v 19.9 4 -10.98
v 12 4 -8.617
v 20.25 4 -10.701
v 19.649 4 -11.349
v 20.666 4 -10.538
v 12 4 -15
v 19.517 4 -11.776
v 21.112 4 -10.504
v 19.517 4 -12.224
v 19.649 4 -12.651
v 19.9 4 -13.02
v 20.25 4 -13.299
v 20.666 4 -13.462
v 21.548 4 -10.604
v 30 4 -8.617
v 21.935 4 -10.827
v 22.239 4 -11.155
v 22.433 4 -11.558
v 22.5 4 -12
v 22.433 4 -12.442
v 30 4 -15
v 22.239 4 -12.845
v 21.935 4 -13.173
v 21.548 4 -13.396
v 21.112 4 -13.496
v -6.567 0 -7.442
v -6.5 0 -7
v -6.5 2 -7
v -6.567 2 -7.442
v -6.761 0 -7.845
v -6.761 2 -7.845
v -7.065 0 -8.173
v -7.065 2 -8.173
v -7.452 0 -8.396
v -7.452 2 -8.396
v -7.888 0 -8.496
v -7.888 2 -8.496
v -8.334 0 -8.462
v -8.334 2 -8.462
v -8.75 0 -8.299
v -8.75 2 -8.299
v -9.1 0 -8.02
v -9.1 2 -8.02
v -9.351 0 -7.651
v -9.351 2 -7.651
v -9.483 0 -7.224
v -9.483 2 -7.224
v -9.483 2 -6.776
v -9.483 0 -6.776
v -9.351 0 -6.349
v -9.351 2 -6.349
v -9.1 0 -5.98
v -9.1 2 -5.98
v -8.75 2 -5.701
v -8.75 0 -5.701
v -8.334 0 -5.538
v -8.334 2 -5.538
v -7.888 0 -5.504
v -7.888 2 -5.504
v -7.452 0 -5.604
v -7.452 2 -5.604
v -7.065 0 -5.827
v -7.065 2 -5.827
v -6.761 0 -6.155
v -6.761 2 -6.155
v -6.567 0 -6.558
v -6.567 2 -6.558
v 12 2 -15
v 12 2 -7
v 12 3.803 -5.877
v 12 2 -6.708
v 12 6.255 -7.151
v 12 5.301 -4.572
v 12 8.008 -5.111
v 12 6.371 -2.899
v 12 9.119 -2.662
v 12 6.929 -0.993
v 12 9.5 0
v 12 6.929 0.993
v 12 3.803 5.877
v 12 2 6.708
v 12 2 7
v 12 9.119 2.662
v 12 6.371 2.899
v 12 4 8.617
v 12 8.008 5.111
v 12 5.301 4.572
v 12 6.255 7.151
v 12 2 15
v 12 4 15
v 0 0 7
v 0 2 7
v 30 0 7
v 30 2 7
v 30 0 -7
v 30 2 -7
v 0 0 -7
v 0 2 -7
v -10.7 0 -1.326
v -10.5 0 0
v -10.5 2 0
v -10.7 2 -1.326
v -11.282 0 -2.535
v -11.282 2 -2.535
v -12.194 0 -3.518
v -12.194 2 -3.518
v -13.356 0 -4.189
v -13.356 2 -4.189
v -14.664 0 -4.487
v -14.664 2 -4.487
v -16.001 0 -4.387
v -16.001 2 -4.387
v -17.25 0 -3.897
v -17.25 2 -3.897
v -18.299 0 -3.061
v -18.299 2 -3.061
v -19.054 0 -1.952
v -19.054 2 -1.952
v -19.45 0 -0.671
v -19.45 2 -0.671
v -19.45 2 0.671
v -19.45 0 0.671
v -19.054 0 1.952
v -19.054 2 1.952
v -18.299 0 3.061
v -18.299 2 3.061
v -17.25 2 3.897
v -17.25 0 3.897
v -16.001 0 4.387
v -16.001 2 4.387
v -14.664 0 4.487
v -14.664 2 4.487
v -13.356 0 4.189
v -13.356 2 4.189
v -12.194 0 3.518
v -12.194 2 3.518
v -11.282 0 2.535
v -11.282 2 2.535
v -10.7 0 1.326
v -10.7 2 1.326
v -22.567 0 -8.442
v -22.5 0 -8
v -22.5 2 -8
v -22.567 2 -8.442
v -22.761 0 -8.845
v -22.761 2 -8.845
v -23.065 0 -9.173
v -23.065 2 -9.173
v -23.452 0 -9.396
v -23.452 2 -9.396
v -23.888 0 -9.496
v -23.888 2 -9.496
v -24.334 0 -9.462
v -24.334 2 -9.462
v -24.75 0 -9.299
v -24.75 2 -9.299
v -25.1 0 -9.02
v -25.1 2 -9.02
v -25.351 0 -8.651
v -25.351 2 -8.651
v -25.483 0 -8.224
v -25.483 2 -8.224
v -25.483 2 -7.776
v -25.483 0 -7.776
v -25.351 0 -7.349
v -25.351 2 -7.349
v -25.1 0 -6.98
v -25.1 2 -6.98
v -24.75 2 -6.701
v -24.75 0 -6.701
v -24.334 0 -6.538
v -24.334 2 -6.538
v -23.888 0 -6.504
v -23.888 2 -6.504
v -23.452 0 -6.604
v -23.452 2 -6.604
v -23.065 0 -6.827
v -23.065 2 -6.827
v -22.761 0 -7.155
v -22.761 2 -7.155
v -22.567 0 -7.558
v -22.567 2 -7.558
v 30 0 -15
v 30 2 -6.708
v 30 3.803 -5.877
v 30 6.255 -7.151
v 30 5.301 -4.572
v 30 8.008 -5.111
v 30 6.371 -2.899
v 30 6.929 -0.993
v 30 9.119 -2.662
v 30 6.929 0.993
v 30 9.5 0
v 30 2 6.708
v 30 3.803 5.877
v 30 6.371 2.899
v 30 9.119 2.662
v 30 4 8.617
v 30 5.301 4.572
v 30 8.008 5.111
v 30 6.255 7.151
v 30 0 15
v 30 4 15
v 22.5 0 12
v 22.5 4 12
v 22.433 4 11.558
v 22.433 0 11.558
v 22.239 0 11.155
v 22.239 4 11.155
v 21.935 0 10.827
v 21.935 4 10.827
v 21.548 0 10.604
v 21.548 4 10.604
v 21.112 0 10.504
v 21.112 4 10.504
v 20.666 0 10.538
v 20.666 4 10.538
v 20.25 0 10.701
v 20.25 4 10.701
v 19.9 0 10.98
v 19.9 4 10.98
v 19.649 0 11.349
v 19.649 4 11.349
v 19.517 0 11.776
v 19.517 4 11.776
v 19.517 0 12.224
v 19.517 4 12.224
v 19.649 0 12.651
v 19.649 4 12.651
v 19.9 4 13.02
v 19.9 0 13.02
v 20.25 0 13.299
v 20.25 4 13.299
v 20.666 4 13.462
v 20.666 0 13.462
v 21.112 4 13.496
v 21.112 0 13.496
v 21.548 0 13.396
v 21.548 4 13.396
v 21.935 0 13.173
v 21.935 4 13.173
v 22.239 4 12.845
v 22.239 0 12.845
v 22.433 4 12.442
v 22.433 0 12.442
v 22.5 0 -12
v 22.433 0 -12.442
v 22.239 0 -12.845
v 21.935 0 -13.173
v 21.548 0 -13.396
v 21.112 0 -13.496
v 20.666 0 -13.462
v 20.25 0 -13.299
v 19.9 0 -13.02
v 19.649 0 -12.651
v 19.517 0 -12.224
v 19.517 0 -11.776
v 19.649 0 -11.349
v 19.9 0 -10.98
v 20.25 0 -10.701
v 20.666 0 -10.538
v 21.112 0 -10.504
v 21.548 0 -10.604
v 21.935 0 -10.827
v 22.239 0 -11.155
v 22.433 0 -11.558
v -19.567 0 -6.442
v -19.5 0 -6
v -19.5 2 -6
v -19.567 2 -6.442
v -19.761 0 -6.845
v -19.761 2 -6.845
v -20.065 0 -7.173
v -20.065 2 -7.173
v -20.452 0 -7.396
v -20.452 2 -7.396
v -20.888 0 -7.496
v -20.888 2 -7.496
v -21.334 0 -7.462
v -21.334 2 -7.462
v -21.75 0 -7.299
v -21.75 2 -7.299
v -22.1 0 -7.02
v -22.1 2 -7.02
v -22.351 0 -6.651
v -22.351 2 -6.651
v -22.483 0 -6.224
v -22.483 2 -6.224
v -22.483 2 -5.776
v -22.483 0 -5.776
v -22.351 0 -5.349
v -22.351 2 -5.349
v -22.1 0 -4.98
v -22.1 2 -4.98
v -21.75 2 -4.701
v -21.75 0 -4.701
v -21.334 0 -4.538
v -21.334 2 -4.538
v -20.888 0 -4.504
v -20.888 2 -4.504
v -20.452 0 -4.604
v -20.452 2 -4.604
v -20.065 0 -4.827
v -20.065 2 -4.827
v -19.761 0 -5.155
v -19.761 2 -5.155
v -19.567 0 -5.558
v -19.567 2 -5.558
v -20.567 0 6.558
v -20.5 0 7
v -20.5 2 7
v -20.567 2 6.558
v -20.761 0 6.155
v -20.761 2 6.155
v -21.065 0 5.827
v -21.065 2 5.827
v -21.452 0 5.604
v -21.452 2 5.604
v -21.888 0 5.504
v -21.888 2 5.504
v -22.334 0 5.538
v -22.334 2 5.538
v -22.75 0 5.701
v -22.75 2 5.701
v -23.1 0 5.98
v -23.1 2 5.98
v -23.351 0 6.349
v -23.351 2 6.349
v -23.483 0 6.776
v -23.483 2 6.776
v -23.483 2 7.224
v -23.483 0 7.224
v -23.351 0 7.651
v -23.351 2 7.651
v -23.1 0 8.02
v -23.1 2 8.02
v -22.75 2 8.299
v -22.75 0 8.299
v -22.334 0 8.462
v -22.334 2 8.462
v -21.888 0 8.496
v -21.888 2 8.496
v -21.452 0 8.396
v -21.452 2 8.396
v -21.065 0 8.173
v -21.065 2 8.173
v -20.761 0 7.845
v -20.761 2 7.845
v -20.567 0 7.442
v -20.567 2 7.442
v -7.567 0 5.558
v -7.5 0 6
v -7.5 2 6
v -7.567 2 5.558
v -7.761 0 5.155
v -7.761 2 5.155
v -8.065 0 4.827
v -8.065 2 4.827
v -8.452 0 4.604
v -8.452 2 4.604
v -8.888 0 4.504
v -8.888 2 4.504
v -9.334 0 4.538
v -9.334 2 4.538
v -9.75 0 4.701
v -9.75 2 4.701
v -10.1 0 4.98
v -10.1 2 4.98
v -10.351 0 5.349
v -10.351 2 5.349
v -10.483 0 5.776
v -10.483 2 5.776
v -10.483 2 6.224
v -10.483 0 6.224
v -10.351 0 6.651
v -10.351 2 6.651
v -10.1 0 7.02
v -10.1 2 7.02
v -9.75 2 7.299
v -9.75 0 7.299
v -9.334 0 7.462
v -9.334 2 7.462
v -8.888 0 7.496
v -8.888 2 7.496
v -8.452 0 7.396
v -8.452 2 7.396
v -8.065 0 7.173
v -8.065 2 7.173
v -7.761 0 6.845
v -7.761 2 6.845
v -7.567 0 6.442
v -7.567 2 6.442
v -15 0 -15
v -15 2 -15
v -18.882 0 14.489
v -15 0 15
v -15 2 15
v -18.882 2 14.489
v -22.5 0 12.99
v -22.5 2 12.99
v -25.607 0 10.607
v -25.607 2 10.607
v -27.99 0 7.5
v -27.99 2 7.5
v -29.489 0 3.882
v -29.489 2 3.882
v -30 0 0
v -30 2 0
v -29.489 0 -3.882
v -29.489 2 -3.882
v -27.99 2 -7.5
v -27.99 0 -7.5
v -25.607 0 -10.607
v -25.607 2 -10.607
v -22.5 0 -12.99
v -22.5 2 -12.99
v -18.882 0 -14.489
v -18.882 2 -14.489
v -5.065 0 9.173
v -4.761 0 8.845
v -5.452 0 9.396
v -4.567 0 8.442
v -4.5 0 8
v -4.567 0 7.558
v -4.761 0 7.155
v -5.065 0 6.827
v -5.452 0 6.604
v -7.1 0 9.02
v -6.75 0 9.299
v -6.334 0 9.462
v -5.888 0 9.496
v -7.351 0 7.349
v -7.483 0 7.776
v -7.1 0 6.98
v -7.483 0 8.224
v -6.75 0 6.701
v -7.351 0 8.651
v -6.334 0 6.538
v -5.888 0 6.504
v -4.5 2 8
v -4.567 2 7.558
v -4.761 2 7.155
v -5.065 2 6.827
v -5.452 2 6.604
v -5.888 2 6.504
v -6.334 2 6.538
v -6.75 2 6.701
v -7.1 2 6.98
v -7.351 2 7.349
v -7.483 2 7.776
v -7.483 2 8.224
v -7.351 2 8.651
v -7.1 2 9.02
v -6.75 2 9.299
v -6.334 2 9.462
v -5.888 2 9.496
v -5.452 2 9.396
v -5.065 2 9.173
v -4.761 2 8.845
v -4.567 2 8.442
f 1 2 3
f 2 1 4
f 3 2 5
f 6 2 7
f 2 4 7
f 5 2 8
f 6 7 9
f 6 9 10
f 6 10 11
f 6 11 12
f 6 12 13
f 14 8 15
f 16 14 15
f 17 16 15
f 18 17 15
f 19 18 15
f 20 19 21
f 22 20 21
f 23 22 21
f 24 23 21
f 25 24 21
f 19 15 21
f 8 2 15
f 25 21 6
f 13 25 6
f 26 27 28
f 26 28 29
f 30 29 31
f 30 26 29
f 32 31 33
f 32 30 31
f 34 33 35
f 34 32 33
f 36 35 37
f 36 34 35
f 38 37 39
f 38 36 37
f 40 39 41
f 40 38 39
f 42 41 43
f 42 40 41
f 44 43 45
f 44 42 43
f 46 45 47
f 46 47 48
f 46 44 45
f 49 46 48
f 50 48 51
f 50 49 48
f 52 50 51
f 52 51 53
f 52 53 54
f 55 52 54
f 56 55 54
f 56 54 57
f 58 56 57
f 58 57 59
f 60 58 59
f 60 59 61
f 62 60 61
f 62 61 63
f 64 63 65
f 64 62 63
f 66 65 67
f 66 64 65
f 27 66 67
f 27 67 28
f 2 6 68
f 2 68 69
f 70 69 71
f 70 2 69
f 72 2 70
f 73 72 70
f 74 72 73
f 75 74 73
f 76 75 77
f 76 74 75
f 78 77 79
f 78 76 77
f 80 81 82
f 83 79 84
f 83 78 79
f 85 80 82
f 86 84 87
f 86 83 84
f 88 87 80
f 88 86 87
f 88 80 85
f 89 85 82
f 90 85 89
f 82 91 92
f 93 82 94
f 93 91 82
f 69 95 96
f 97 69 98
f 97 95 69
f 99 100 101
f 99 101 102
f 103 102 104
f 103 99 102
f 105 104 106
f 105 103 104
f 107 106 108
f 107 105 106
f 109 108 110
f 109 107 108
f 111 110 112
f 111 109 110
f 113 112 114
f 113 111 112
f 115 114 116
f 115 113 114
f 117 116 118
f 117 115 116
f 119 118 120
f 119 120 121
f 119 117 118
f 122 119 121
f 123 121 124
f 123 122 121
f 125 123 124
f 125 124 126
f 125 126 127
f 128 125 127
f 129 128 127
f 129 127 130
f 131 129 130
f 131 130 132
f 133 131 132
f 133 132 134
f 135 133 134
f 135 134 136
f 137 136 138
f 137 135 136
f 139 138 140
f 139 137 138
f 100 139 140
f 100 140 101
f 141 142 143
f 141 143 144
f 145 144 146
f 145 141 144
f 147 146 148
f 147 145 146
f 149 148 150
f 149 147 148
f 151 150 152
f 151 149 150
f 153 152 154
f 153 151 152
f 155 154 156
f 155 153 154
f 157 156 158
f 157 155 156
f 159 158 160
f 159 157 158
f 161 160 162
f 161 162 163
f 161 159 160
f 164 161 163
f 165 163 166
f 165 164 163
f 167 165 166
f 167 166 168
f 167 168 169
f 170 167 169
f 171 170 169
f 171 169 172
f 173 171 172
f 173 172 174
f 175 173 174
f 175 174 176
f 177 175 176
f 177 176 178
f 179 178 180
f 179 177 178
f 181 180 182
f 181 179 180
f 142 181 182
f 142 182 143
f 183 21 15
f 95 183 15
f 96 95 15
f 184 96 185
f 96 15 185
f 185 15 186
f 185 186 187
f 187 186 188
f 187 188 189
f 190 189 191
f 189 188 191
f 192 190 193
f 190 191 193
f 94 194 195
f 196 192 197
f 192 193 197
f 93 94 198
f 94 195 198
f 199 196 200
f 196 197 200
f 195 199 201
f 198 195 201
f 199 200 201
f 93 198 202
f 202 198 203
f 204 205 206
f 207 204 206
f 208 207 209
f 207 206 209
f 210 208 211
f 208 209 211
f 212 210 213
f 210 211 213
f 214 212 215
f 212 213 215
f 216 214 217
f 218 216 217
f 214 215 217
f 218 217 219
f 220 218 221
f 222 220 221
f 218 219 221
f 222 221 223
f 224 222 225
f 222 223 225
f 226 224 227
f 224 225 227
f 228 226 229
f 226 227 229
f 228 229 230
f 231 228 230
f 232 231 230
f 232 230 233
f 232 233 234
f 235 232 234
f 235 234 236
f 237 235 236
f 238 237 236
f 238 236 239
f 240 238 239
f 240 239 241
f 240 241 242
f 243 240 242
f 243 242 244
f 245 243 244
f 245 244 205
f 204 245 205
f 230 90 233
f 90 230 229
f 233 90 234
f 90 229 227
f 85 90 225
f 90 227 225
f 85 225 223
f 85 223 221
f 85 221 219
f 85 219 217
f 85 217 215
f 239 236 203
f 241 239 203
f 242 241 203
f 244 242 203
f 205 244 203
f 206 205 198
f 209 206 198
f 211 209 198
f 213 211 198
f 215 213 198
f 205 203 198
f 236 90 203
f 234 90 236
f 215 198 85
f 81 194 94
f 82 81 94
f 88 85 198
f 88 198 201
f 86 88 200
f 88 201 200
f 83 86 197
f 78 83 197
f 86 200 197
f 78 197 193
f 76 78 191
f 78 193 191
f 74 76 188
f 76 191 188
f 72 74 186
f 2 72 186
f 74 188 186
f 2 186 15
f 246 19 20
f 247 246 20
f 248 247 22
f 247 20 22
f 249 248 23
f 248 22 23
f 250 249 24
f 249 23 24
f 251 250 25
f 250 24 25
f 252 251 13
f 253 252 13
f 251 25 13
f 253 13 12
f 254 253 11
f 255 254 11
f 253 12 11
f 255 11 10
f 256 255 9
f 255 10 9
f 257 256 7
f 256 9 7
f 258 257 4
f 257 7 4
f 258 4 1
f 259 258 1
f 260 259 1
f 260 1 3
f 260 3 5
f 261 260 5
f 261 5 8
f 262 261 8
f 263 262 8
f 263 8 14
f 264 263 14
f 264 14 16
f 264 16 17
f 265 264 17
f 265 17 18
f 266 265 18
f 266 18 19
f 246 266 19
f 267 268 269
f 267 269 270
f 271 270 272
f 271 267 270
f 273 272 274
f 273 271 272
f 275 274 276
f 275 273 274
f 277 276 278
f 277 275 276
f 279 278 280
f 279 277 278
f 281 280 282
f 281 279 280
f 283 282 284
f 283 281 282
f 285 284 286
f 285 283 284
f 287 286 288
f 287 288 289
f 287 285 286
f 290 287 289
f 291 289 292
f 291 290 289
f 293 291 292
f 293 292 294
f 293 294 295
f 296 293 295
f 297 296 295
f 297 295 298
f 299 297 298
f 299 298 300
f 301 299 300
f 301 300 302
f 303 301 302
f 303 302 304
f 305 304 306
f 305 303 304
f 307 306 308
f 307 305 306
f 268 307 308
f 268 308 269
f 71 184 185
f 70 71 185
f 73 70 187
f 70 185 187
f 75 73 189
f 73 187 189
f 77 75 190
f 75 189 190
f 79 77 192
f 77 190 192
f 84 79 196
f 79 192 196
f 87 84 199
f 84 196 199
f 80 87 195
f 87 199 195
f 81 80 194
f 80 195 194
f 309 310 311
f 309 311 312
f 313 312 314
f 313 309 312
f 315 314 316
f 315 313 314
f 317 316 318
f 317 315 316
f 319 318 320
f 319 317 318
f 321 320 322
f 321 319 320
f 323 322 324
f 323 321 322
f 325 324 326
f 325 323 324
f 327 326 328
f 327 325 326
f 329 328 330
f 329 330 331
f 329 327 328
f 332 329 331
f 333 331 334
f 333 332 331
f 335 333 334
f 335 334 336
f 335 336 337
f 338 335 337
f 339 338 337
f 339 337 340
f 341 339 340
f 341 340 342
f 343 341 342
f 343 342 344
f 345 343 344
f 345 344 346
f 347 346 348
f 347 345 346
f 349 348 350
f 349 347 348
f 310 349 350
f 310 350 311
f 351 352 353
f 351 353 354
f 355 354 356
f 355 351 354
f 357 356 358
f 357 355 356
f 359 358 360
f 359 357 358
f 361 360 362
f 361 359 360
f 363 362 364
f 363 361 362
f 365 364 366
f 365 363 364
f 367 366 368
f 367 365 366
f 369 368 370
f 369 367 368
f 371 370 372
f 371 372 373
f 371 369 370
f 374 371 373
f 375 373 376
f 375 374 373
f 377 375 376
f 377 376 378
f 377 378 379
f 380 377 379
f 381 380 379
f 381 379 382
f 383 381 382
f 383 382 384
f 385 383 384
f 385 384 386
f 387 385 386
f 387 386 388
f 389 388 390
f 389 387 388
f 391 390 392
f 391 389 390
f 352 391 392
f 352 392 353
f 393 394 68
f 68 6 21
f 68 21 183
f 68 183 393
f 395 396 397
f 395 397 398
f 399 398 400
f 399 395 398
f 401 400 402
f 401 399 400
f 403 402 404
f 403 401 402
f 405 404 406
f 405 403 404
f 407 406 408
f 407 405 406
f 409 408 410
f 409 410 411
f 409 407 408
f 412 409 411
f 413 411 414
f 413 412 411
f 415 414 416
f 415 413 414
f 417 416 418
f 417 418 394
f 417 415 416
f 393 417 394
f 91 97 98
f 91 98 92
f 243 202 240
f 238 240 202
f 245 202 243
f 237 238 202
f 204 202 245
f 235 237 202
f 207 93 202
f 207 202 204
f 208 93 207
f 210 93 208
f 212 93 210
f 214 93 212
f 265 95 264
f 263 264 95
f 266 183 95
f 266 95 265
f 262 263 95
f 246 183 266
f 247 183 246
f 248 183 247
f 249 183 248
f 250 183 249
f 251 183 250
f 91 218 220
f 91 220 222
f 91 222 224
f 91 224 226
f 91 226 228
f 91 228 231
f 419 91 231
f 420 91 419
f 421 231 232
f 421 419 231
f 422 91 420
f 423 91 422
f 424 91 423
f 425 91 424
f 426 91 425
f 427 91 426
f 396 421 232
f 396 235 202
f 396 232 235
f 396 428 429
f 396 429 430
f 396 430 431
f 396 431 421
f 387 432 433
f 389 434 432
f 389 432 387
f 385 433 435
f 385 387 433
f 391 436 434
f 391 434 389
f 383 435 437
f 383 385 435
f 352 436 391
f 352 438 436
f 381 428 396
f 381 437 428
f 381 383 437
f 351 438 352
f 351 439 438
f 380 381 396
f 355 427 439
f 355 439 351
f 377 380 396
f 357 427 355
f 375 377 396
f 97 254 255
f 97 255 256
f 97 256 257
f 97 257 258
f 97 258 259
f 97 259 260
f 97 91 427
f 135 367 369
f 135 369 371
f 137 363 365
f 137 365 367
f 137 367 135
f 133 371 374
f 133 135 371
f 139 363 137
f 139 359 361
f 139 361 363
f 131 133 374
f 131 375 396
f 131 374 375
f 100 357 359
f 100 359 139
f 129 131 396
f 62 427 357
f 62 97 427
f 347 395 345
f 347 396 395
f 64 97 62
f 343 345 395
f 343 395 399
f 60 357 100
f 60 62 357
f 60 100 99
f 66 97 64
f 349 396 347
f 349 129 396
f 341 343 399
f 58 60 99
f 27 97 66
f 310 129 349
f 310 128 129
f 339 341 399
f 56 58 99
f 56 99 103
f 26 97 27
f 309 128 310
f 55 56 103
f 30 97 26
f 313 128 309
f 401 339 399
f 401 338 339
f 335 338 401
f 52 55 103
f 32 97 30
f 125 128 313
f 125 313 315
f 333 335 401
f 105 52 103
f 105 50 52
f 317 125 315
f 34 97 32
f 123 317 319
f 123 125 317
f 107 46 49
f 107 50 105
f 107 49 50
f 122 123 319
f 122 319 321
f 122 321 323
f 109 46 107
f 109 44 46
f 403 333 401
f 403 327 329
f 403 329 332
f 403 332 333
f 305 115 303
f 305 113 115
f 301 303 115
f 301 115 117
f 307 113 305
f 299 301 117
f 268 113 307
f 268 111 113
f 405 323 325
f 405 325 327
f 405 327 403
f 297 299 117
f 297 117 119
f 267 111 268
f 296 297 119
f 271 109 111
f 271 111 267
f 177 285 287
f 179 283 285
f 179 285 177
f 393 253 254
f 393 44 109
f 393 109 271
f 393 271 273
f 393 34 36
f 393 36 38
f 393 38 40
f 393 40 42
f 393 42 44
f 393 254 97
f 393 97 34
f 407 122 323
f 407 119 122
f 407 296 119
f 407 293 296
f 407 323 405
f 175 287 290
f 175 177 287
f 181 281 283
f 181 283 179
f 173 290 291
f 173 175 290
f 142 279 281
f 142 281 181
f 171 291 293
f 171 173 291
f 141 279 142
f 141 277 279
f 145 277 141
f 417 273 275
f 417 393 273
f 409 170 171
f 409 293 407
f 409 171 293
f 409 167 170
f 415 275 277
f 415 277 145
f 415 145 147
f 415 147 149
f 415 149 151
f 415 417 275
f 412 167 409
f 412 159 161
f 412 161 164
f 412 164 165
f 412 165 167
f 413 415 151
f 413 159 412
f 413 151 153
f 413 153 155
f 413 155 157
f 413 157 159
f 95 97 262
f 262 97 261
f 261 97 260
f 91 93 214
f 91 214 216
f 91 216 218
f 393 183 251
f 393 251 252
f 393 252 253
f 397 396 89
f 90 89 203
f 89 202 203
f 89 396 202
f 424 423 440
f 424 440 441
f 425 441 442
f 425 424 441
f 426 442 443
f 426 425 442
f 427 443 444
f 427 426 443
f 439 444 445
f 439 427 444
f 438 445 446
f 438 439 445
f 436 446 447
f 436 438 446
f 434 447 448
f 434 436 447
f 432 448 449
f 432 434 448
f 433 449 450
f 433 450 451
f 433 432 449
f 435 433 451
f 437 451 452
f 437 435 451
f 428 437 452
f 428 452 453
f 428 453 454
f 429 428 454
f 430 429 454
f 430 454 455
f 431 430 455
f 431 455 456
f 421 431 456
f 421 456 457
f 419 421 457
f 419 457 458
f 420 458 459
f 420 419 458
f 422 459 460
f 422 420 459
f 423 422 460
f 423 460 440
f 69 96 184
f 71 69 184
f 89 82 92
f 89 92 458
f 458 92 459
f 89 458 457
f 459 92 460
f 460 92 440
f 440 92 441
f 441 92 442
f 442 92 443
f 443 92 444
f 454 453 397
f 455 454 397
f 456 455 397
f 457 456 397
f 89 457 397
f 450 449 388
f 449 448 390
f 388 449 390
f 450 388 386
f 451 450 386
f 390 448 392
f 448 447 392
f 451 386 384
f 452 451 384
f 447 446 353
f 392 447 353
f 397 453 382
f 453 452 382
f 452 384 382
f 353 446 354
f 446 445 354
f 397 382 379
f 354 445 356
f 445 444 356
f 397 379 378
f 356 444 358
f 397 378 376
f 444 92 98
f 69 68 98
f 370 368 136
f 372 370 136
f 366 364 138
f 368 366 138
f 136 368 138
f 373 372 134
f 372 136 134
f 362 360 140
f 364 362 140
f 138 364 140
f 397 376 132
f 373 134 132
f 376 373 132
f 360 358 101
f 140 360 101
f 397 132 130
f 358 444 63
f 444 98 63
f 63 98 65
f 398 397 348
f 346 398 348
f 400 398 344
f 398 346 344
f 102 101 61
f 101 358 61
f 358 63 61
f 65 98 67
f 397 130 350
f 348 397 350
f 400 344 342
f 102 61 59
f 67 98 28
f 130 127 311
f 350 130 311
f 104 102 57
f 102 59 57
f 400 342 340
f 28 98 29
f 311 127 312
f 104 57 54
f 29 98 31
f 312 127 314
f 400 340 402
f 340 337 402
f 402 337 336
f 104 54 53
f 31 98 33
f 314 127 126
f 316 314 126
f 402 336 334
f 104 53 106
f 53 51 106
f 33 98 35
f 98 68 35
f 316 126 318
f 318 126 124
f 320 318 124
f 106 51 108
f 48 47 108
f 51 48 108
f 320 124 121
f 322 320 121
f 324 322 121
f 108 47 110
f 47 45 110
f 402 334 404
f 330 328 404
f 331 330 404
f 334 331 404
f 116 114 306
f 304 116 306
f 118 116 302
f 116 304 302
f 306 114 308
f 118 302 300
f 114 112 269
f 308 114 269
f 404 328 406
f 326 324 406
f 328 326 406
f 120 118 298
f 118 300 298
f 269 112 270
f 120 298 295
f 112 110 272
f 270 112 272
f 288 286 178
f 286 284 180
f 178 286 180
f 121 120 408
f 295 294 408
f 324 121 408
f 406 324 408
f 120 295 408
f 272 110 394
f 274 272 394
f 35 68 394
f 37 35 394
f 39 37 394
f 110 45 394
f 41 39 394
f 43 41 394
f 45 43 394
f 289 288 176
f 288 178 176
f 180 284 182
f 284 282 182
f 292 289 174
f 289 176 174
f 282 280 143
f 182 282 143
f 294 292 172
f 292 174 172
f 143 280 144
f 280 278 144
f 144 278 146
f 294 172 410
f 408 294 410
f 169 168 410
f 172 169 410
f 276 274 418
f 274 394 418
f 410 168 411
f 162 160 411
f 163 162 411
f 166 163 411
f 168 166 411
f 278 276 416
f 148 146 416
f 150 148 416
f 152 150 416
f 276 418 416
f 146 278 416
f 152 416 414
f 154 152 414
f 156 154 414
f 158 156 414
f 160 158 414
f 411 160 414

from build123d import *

# Parameters (mm, degrees)
ESBO_O1_R                = 4.5
ESBO_O1_R_2              = 1.5
RESSALTO_EXTRUS_O1_DEPTH = 2
RESSALTO_EXTRUS_O2_DEPTH = 18
ESBO_O3_R                = 7
CORTE_EXTRUS_O1_DEPTH    = 18
ESBO_O4_R                = 1.5
CORTE_EXTRUS_O2_DEPTH    = 17


with BuildPart() as part:
    # Esboço1 → Ressalto-extrusão1 (new body)
    with BuildSketch(Plane(origin=(0, 0, 0), x_dir=(1, 0, 0), z_dir=(0, 1, 0))):
        with BuildLine():
            Line((30, 15), (30, 7))
            Line((30, 7), (0, 7))
            Line((0, 7), (0, -7))
            Line((0, -7), (30, -7))
            Line((30, -7), (30, -15))
            Line((30, -15), (-15, -15))
            ThreePointArc((-15, -15), (-30, 0), (-15, 15))
            Line((-15, 15), (30, 15))
        make_face()
        with Locations((-15, 0)):
            Circle(ESBO_O1_R, mode=Mode.SUBTRACT)
        with Locations((-9, -6)):
            Circle(ESBO_O1_R_2, mode=Mode.SUBTRACT)
        with Locations((-6, -8)):
            Circle(ESBO_O1_R_2, mode=Mode.SUBTRACT)
        with Locations((-22, -7)):
            Circle(ESBO_O1_R_2, mode=Mode.SUBTRACT)
        with Locations((-21, 6)):
            Circle(ESBO_O1_R_2, mode=Mode.SUBTRACT)
        with Locations((-24, 8)):
            Circle(ESBO_O1_R_2, mode=Mode.SUBTRACT)
        with Locations((-8, 7)):
            Circle(ESBO_O1_R_2, mode=Mode.SUBTRACT)
    extrude(amount=RESSALTO_EXTRUS_O1_DEPTH)

    # Esboço2 → Ressalto-extrusão2 (add)
    with BuildSketch(Plane(origin=(30, 0, 0), x_dir=(0, 0, -1), z_dir=(1, 0, 0))):
        with BuildLine():
            Line((-15, 2), (-15, 4))
            Line((-15, 4), (-8.61684397, 4))
            ThreePointArc((-8.61684397, 4), (0, 9.5), (8.61684397, 4))
            Line((8.61684397, 4), (15, 4))
            Line((15, 4), (15, 2))
            Line((15, 2), (-15, 2))
        make_face()
    extrude(amount=-RESSALTO_EXTRUS_O2_DEPTH)

    # Esboço3 → Corte-extrusão1 (cut)
    with BuildSketch(Plane(origin=(30, 0, 0), x_dir=(0, 0, -1), z_dir=(1, 0, 0))):
        Circle(ESBO_O3_R)
    extrude(amount=-CORTE_EXTRUS_O1_DEPTH, mode=Mode.SUBTRACT)

    # Esboço4 → Corte-extrusão2 (cut)
    with BuildSketch(Plane(origin=(0, 4, 0), x_dir=(1, 0, 0), z_dir=(0, 1, 0))):
        with Locations((21, 12)):
            Circle(ESBO_O4_R)
        with Locations((21, -12)):
            Circle(ESBO_O4_R)
    extrude(amount=-CORTE_EXTRUS_O2_DEPTH, mode=Mode.SUBTRACT)


solid = part.part
